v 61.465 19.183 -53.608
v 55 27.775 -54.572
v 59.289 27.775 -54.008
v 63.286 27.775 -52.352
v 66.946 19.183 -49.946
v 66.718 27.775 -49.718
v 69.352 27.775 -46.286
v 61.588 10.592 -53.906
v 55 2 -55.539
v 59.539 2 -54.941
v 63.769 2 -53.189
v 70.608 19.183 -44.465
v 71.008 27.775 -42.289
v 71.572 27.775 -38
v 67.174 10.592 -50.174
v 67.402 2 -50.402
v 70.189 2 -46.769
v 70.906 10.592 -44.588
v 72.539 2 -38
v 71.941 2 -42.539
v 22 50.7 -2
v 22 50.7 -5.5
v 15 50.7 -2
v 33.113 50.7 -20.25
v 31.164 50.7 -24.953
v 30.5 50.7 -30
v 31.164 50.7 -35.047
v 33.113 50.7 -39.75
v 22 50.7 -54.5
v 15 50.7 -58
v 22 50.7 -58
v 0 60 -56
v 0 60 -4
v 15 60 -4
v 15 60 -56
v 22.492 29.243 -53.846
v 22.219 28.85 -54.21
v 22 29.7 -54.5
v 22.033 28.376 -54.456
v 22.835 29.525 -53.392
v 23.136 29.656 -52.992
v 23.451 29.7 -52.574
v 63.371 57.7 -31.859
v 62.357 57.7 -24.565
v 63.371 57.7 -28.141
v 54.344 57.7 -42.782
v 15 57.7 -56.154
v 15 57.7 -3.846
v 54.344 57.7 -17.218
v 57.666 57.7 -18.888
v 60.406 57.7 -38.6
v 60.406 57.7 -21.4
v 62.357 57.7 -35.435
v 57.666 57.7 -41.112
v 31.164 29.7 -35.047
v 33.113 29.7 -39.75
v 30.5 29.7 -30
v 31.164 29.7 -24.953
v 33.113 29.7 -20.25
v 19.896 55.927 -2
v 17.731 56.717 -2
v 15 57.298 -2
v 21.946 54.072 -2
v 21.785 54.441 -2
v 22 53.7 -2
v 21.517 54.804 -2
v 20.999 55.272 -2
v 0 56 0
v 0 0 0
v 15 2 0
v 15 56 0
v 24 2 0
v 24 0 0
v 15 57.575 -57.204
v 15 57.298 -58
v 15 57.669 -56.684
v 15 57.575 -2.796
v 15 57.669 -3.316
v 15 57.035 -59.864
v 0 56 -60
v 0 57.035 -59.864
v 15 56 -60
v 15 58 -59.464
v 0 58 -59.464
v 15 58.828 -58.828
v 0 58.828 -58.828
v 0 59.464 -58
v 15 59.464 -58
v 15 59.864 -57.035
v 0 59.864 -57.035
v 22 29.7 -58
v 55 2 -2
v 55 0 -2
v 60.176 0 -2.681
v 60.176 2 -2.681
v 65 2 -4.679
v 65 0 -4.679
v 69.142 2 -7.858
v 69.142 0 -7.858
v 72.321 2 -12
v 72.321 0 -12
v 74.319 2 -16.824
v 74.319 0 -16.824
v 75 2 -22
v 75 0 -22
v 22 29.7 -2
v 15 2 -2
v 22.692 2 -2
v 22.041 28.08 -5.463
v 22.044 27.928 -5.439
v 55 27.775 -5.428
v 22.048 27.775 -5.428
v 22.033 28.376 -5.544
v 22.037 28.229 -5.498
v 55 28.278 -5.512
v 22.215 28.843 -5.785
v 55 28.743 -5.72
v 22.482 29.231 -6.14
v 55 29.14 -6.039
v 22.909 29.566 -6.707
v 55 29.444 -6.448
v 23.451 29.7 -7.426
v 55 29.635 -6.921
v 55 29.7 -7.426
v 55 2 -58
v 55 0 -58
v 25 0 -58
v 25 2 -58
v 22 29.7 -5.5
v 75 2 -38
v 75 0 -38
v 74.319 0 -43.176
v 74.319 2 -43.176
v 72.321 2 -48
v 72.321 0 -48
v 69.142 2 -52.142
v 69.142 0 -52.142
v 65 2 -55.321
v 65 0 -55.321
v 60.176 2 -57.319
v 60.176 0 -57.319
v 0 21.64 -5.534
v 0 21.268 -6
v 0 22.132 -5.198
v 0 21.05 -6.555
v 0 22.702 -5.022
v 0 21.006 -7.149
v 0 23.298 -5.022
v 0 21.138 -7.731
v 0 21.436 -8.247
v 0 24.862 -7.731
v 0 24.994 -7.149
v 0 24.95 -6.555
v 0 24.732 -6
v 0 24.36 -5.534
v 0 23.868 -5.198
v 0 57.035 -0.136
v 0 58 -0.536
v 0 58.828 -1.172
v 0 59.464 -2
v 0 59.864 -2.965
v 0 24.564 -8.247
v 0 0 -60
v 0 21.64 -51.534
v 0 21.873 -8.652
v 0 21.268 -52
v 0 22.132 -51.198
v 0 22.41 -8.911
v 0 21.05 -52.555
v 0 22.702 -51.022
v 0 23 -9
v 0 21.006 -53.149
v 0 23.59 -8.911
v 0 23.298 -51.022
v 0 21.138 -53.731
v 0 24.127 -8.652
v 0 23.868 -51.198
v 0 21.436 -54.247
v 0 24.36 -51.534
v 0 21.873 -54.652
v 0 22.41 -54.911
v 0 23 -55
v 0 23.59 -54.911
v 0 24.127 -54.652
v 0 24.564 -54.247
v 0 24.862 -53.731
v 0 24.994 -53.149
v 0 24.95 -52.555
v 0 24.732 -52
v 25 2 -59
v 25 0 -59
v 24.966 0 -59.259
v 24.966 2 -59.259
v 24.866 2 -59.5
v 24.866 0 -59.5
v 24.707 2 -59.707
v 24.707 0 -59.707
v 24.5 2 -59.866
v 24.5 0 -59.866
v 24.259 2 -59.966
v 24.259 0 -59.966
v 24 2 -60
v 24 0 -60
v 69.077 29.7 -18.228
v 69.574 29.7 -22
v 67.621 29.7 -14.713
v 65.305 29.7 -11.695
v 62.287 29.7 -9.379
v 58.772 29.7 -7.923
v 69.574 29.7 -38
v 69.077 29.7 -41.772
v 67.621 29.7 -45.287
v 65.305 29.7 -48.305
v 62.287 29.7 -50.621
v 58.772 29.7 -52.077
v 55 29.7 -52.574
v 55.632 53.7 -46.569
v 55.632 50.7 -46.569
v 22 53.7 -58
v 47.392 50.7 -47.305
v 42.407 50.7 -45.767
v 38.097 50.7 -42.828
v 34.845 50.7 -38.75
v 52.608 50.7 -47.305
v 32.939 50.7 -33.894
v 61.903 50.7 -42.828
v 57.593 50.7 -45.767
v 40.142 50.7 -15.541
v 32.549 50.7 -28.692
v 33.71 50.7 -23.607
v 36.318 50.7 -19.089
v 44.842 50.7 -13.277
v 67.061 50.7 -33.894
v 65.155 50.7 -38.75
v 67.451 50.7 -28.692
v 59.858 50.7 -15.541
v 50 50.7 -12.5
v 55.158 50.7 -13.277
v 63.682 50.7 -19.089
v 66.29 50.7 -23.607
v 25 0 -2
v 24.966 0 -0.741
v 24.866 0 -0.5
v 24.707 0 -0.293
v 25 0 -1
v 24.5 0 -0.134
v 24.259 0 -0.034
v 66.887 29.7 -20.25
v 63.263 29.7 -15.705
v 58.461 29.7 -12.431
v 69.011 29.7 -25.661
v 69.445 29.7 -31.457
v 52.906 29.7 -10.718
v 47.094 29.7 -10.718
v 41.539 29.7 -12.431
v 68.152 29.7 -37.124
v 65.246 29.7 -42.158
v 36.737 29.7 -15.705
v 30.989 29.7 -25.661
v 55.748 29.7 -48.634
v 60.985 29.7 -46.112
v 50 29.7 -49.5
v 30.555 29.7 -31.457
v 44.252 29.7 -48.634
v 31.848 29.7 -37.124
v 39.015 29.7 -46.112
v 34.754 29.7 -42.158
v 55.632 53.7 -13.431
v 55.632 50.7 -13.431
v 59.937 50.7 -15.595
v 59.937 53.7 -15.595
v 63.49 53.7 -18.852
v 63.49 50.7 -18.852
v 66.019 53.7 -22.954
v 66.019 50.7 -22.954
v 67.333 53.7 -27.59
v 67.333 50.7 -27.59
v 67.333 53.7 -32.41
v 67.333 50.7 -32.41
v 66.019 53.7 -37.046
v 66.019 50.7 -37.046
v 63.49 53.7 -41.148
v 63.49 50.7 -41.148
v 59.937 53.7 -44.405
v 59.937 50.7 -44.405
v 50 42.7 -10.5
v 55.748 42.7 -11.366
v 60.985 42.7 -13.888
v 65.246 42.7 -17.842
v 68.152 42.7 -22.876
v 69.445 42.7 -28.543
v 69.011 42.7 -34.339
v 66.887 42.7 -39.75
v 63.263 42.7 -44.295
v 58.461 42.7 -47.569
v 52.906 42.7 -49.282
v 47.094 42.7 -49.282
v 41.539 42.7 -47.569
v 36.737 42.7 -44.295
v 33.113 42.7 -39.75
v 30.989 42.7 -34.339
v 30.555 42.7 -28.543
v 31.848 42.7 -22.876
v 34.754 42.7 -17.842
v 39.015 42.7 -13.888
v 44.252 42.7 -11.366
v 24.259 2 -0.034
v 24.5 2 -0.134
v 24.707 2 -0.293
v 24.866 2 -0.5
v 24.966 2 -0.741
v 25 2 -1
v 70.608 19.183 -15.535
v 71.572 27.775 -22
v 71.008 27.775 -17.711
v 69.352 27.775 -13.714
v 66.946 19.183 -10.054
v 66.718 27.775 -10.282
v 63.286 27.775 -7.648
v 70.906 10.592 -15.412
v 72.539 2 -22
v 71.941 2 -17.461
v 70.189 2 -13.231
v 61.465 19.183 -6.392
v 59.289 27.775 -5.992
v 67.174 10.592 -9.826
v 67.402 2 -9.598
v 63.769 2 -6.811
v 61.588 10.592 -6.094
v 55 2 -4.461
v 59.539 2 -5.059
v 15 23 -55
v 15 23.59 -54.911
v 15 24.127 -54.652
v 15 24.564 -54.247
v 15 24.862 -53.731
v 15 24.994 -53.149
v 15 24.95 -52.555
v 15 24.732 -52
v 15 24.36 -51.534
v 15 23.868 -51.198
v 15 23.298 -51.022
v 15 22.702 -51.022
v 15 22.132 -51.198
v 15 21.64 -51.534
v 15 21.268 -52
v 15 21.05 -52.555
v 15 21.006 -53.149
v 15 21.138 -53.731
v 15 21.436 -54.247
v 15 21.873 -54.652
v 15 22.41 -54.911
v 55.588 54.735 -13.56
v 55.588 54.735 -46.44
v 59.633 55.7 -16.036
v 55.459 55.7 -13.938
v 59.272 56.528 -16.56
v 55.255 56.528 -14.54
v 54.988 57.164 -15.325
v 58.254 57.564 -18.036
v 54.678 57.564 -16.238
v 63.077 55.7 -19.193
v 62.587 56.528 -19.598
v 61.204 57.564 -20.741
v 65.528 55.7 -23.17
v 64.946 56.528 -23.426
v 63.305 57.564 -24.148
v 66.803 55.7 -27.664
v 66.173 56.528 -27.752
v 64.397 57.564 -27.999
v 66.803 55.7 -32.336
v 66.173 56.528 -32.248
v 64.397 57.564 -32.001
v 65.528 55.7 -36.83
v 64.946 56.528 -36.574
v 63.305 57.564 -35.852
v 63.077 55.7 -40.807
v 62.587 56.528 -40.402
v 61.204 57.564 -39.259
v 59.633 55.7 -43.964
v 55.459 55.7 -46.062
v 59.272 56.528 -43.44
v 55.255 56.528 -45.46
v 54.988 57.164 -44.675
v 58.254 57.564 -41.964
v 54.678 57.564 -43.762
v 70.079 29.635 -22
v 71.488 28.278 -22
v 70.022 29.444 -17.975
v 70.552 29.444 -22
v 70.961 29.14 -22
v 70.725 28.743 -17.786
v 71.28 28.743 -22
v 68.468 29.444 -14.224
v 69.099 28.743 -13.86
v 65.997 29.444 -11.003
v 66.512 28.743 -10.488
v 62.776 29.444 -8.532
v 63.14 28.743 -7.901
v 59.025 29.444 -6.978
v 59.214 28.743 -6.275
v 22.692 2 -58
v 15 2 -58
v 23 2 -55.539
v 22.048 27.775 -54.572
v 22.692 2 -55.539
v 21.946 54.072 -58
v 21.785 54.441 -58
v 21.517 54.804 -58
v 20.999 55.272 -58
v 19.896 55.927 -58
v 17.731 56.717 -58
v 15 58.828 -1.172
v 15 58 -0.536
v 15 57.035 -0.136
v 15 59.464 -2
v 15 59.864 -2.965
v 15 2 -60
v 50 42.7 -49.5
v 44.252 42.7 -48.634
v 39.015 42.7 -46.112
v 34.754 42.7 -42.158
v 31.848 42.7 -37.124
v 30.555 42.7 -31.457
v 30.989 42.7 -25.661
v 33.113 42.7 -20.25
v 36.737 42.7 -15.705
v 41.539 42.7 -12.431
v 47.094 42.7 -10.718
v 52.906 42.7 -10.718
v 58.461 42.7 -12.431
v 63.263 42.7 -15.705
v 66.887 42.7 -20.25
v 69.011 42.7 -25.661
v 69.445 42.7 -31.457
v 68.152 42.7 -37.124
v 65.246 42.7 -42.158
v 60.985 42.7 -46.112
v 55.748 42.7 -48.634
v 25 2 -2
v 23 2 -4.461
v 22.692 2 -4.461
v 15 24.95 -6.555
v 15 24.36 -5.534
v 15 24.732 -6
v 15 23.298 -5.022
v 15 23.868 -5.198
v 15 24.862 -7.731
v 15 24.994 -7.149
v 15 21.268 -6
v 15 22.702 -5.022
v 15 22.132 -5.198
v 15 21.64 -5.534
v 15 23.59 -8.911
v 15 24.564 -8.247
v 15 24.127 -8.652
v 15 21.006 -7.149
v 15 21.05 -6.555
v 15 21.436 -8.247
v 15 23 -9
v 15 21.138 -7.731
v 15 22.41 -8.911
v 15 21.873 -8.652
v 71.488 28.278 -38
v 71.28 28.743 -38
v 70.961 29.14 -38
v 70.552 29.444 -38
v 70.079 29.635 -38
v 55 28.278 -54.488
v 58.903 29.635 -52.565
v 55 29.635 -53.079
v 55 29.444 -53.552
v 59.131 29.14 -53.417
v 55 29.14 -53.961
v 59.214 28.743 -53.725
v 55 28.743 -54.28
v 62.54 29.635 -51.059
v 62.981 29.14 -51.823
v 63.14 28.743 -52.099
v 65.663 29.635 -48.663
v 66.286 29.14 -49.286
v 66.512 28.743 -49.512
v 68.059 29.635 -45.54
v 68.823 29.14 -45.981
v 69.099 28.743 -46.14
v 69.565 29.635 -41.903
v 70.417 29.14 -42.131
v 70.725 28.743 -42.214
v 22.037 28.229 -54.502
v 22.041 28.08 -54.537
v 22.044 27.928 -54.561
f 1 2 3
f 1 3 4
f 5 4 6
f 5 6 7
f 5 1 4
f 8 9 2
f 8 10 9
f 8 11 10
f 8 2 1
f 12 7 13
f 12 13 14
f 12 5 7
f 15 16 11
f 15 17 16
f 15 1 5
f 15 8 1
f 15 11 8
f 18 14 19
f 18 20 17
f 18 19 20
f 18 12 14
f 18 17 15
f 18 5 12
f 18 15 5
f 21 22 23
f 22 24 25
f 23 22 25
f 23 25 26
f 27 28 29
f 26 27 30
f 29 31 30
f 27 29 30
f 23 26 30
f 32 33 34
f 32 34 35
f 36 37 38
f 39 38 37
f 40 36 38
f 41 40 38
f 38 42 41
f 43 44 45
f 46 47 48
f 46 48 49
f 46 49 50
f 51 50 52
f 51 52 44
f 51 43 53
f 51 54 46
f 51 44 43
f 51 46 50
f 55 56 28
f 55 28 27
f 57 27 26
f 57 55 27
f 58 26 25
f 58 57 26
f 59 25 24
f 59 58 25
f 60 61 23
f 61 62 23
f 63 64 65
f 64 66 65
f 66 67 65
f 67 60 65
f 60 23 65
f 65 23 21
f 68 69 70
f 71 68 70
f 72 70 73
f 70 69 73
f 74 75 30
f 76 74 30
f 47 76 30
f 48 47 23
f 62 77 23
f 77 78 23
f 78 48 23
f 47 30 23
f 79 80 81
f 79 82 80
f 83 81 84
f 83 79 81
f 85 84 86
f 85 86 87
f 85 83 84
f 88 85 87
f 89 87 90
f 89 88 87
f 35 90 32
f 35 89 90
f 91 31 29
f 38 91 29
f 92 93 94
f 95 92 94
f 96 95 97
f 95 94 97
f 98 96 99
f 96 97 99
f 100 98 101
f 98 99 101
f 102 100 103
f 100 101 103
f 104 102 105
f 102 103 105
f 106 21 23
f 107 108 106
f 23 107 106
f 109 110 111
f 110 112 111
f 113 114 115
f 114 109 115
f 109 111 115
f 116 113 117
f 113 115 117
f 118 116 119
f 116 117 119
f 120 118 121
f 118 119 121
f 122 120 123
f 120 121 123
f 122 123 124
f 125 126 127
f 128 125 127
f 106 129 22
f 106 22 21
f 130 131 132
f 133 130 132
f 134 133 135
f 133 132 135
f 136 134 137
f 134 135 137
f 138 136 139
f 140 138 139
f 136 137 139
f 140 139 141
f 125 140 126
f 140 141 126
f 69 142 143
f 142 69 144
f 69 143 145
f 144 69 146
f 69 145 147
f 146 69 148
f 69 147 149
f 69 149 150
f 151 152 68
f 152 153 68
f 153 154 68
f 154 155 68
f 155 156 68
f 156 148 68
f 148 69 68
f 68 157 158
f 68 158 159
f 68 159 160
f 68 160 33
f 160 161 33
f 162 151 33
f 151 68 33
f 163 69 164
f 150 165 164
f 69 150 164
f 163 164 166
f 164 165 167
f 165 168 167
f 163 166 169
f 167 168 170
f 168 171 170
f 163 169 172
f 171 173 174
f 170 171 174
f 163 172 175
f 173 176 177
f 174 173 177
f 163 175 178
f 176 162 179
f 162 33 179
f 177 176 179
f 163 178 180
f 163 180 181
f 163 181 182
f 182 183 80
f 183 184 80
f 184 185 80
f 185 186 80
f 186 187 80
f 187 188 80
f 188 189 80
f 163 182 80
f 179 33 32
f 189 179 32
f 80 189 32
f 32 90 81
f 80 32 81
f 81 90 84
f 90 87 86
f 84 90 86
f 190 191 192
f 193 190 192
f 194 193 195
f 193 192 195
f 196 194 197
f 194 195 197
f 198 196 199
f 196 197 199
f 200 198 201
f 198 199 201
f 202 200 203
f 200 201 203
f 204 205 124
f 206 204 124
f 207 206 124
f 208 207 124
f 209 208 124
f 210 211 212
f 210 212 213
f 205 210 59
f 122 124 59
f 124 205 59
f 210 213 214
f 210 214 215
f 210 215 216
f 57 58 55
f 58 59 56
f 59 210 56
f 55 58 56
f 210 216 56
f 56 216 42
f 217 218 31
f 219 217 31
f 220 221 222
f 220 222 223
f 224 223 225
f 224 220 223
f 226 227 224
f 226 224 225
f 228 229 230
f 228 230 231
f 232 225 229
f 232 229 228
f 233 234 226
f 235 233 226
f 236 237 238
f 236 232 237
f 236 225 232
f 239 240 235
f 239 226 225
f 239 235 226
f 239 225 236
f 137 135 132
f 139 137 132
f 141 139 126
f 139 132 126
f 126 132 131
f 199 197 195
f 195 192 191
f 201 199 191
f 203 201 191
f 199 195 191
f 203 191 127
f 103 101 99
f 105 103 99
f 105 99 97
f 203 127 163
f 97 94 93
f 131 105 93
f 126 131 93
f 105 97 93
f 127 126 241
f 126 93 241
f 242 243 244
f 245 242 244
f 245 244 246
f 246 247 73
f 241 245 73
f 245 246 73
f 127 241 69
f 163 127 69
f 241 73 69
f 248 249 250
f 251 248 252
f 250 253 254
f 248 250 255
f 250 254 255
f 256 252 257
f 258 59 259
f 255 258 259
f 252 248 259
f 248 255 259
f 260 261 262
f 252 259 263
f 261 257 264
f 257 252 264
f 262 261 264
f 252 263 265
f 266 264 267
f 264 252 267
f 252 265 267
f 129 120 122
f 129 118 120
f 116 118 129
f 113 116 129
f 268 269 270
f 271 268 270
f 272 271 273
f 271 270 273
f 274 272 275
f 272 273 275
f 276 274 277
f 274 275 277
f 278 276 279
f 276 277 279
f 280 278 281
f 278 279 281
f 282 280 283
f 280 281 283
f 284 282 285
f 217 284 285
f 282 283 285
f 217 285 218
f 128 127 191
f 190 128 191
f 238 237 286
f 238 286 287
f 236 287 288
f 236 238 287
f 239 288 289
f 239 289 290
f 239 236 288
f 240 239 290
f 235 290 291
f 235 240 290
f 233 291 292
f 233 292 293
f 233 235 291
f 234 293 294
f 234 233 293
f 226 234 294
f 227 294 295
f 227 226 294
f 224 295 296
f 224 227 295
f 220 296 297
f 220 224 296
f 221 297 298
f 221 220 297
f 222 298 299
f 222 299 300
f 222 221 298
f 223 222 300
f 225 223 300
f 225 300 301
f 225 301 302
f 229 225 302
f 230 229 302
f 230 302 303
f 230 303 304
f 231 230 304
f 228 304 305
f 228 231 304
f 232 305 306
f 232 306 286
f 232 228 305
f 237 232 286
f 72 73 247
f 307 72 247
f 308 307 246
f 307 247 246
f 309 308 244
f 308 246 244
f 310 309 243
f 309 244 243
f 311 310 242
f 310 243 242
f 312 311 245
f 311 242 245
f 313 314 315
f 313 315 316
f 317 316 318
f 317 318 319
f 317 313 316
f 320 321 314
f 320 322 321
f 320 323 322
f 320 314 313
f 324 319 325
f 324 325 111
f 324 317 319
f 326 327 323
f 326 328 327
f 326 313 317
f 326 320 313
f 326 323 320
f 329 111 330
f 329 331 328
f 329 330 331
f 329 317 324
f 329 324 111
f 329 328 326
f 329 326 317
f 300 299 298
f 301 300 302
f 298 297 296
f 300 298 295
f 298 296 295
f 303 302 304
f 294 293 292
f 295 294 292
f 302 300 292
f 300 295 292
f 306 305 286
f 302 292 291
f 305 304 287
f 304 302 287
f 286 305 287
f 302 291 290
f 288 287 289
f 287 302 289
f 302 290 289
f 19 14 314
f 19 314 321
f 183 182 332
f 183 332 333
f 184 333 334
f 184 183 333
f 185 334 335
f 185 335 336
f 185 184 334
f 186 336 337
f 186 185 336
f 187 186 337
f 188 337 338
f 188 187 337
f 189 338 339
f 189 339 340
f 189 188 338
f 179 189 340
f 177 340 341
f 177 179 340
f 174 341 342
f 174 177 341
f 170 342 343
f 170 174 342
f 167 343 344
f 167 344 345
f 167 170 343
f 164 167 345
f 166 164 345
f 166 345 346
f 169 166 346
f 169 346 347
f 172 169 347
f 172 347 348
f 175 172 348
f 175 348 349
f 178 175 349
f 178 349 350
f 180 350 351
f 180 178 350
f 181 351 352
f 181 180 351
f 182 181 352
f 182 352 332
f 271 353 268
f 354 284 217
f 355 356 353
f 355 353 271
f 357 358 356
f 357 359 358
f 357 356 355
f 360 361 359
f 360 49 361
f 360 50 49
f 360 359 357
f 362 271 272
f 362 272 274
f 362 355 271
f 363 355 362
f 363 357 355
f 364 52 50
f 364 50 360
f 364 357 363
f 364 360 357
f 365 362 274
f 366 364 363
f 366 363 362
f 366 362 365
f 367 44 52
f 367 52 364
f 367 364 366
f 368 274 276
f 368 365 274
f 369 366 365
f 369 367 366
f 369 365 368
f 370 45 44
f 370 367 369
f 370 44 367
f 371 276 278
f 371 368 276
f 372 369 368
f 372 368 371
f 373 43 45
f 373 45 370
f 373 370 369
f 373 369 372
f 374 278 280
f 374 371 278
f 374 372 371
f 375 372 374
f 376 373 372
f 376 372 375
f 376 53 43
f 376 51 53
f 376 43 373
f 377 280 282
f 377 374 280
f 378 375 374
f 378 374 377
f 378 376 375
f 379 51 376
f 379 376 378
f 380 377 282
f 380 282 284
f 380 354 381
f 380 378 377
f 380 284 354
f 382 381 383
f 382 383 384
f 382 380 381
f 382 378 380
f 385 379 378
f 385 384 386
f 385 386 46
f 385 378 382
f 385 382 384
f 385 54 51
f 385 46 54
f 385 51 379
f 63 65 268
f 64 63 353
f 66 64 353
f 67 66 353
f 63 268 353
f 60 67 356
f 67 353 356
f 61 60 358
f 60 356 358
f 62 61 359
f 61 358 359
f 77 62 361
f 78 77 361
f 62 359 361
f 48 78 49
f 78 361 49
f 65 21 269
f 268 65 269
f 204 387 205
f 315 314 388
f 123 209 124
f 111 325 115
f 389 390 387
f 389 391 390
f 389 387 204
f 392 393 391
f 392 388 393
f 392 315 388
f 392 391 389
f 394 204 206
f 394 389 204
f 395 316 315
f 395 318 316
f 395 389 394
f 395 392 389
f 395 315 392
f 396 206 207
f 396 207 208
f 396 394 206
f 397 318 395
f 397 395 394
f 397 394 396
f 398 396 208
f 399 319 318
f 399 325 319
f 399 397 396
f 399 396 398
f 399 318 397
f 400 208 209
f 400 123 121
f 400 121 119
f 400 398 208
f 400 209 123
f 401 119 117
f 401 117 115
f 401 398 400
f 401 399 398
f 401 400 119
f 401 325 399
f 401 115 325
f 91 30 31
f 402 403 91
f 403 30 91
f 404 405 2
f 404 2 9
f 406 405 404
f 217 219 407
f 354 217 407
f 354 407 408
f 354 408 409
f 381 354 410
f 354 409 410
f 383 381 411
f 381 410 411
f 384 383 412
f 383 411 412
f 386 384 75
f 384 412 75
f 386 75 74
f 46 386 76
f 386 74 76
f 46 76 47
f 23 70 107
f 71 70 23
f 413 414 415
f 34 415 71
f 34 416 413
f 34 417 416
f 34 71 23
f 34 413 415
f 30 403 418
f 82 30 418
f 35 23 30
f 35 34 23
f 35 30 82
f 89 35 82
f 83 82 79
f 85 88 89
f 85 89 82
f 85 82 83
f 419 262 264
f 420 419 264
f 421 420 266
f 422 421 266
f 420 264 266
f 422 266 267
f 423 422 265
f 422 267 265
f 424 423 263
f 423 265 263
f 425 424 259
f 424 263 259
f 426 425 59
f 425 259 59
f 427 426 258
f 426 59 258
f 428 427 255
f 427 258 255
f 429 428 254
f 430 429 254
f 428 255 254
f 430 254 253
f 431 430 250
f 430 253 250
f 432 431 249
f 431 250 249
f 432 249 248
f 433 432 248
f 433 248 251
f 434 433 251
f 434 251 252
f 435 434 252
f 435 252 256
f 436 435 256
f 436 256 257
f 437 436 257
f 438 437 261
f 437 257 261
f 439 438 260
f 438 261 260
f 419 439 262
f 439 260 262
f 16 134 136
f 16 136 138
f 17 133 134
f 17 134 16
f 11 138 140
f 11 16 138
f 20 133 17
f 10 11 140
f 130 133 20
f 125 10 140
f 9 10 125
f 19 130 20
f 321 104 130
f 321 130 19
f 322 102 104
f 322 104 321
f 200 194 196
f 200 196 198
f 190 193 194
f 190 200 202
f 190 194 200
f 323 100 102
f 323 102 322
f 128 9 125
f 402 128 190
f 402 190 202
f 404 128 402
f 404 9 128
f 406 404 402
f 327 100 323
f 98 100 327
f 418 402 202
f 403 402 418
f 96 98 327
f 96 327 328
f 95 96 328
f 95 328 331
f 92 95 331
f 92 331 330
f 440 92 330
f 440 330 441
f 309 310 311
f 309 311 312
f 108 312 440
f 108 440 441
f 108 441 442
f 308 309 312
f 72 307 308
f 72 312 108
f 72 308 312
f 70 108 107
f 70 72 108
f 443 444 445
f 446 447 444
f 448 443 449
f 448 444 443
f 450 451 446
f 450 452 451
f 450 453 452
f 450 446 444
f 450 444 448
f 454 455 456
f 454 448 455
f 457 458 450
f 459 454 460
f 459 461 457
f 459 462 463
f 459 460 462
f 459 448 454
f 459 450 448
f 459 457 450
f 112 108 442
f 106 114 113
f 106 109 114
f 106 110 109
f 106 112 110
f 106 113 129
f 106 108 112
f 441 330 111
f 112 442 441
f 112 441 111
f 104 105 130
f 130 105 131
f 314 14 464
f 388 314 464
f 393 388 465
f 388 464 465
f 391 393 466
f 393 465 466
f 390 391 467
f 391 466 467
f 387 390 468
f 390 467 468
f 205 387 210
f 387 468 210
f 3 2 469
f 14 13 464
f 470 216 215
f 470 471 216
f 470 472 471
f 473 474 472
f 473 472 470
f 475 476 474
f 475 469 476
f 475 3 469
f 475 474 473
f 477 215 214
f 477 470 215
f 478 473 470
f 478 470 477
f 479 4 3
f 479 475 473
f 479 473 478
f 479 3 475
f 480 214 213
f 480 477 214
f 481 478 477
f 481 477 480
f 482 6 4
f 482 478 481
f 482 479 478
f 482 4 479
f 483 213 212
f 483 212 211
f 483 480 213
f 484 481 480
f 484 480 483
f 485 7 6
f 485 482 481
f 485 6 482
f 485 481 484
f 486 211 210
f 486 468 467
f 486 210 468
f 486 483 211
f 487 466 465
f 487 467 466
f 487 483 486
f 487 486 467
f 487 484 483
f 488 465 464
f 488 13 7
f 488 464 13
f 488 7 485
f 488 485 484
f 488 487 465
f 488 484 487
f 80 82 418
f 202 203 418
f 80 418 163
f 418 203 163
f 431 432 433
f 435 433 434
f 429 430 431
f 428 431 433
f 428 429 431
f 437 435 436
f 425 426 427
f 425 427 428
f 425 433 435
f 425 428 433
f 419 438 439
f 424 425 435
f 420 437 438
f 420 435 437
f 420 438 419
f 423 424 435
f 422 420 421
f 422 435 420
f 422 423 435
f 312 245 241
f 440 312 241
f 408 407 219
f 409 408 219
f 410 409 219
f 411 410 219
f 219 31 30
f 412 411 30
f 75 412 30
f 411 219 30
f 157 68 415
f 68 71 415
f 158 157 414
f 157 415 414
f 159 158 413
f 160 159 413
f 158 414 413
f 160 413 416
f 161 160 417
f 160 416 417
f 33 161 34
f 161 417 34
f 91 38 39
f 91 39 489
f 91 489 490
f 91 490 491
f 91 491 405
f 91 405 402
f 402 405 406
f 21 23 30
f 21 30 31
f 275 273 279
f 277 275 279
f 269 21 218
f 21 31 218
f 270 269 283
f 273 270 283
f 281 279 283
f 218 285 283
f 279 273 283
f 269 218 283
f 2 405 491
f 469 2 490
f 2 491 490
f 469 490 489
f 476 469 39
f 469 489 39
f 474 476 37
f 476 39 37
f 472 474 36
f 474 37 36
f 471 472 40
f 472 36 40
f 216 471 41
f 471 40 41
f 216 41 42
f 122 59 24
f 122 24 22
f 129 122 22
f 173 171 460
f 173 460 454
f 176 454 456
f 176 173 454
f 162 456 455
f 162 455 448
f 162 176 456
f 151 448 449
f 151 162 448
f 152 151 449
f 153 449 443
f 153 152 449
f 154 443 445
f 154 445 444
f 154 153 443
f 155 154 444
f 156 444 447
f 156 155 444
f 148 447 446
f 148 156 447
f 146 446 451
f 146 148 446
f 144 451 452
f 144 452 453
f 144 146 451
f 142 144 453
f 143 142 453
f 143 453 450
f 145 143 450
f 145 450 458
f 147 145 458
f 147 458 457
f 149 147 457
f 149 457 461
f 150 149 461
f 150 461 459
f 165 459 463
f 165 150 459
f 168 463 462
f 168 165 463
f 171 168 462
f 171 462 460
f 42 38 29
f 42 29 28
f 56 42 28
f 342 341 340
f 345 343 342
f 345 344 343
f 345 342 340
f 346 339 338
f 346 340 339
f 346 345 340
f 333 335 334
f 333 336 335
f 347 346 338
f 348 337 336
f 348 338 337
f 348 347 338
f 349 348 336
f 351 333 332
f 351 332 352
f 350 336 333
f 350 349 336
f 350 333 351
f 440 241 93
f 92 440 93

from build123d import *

# Parameters (mm, degrees)
ESQUISSE1_W        = 60
ESQUISSE1_H        = 60
ESQUISSE1_R        = 2
BOSS_EXTRU_1_DEPTH = 15
BOSS_EXTRU_2_DEPTH = 2
BOSS_EXTRU_3_DEPTH = 27.7
CHANFREIN1_SIZE    = 1.5
CHANFREIN1_SIZE_2  = 40
CHANFREIN2_SIZE    = 1
CHANFREIN2_SIZE_2  = 40
BOSS_EXTRU_4_DEPTH = 21
ESQUISSE5_R        = 19.5
BOSS_EXTRU_5_DEPTH = 13
ESQUISSE6_R        = 19.5
BOSS_EXTRU_6_DEPTH = 8
CHANFREIN3_SIZE    = 8
CHANFREIN3_SIZE_2  = 2
BOSS_EXTRU_9_DEPTH = 7
CONG_3_R           = 2
CONG_4_R           = 4
CONG_5_R           = 4


with BuildPart() as part:
    # Esquisse1 → Boss.-Extru.1 (new body)
    with BuildSketch(Plane(origin=(0, 0, 0), x_dir=(0, 0, -1), z_dir=(1, 0, 0))):
        with Locations((30, 30)):
            Rectangle(ESQUISSE1_W, ESQUISSE1_H)
        with Locations((7, 23)):
            Circle(ESQUISSE1_R, mode=Mode.SUBTRACT)
        with Locations((53, 23)):
            Circle(ESQUISSE1_R, mode=Mode.SUBTRACT)
    extrude(amount=BOSS_EXTRU_1_DEPTH)

    # Esquisse2 → Boss.-Extru.2 (add)
    with BuildSketch(Plane.XZ):
        with BuildLine():
            Line((15, 0), (24, 0))
            ThreePointArc((24, 0), (24.707106781, -0.292893219), (25, -1))
            Line((25, -1), (25, -2))
            Line((25, -2), (55, -2))
            ThreePointArc((55, -2), (69.142135624, -7.857864376), (75, -22))
            Line((75, -22), (75, -38))
            ThreePointArc((75, -38), (69.142135624, -52.142135624), (55, -58))
            Line((55, -58), (25, -58))
            Line((25, -58), (25, -59))
            ThreePointArc((25, -59), (24.707106781, -59.707106781), (24, -60))
            Line((24, -60), (15, -60))
            Line((15, -60), (15, 0))
        make_face()
    extrude(amount=-BOSS_EXTRU_2_DEPTH)

    # Esquisse3 → Boss.-Extru.3 (add)
    with BuildSketch(Plane(origin=(0, 2, 0), x_dir=(1, 0, 0), z_dir=(0, 1, 0))):
        with BuildLine():
            Line((23, 2), (15, 2))
            Line((15, 2), (15, 58))
            Line((15, 58), (23, 58))
            Line((23, 58), (23, 56))
            Line((23, 56), (55, 56))
            ThreePointArc((55, 56), (67.727922061, 50.727922061), (73, 38))
            Line((73, 38), (73, 22))
            ThreePointArc((73, 22), (67.727922061, 9.272077939), (55, 4))
            Line((55, 4), (23, 4))
            Line((23, 4), (23, 2))
        make_face()
    extrude(amount=BOSS_EXTRU_3_DEPTH)

    # Chanfrein1
    # the kernel refuses this chamfer: 40, 1.5 mm, written as the material it takes off along each edge
    with BuildSketch(Plane(origin=(23, 29.7, -56), x_dir=(0, 0.7157643485721592, 0.6983418914207227), z_dir=(1, 0, 0))) as chanfrein1_piece_1_section:
        Polygon((CHANFREIN1_SIZE * 0.698341891421, CHANFREIN1_SIZE * 0.715764348572), (-CHANFREIN1_SIZE_2 * 0.715764348572, CHANFREIN1_SIZE_2 * 0.698341891421), (0, 0), align=None)
    chanfrein1_piece_1 = extrude(amount=32, mode=Mode.PRIVATE)
    chanfrein1_piece_1 = split(chanfrein1_piece_1, bisect_by=Plane(origin=(37.024131868, 2, -55.4897808), z_dir=(0, 1, 0)), keep=Keep.TOP, mode=Mode.PRIVATE)
    add(chanfrein1_piece_1, mode=Mode.SUBTRACT)
    with BuildSketch(Plane(origin=(55, 29.7, -38), x_dir=(0, 0, -1), z_dir=(-1, 0, 0))) as chanfrein1_piece_2_section:
        Polygon((18 - CHANFREIN1_SIZE, 0), (18, CHANFREIN1_SIZE_2), (18, 0), align=None)
    chanfrein1_piece_2 = revolve(axis=Axis((55, 29.7, -38), (0, -1, 0)), revolution_arc=90, mode=Mode.PRIVATE)
    chanfrein1_piece_2 = split(chanfrein1_piece_2, bisect_by=Plane(origin=(67.098576513, 2, -50.098576513), z_dir=(0, 1, 0)), keep=Keep.TOP, mode=Mode.PRIVATE)
    add(chanfrein1_piece_2, mode=Mode.SUBTRACT)
    with BuildSketch(Plane(origin=(55, 29.7, -4), x_dir=(0, 0.7157643485721598, -0.698341891420722), z_dir=(-1, 0, 0))) as chanfrein1_piece_3_section:
        Polygon((CHANFREIN1_SIZE * 0.698341891421, CHANFREIN1_SIZE * 0.715764348572), (-CHANFREIN1_SIZE_2 * 0.715764348572, CHANFREIN1_SIZE_2 * 0.698341891421), (0, 0), align=None)
    chanfrein1_piece_3 = extrude(amount=32, mode=Mode.PRIVATE)
    chanfrein1_piece_3 = split(chanfrein1_piece_3, bisect_by=Plane(origin=(52.691459865, 2, -4.656531492), z_dir=(0, 1, 0)), keep=Keep.TOP, mode=Mode.PRIVATE)
    add(chanfrein1_piece_3, mode=Mode.SUBTRACT)
    with BuildSketch(Plane(origin=(73, 29.7, -38), x_dir=(-0.6983418914207212, 0.7157643485721609, 0), z_dir=(0, 0, 1))) as chanfrein1_piece_4_section:
        Polygon((CHANFREIN1_SIZE * 0.698341891421, CHANFREIN1_SIZE * 0.715764348572), (-CHANFREIN1_SIZE_2 * 0.715764348572, CHANFREIN1_SIZE_2 * 0.698341891421), (0, 0), align=None)
    chanfrein1_piece_4 = extrude(amount=16, mode=Mode.PRIVATE)
    chanfrein1_piece_4 = split(chanfrein1_piece_4, bisect_by=Plane(origin=(72.334165333, 2, -35.67535471), z_dir=(0, 1, 0)), keep=Keep.TOP, mode=Mode.PRIVATE)
    add(chanfrein1_piece_4, mode=Mode.SUBTRACT)
    with BuildSketch(Plane(origin=(55, 29.7, -22), x_dir=(1, 0, 0), z_dir=(0, 0, -1))) as chanfrein1_piece_5_section:
        Polygon((18 - CHANFREIN1_SIZE, 0), (18, CHANFREIN1_SIZE_2), (18, 0), align=None)
    chanfrein1_piece_5 = revolve(axis=Axis((55, 29.7, -22), (0, -1, 0)), revolution_arc=90, mode=Mode.PRIVATE)
    chanfrein1_piece_5 = split(chanfrein1_piece_5, bisect_by=Plane(origin=(67.098576513, 2, -9.901423487), z_dir=(0, 1, 0)), keep=Keep.TOP, mode=Mode.PRIVATE)
    add(chanfrein1_piece_5, mode=Mode.SUBTRACT)

    # Chanfrein2
    # the kernel refuses this chamfer: 40, 1 mm, written as the material it takes off along each edge
    with BuildSketch(Plane(origin=(23, 29.7, 49.498798633), x_dir=(-0.5451034374320658, 0.8383687986201215, 0), z_dir=(0, 0, -1))) as chanfrein2_piece_1_section:
        Polygon((CHANFREIN2_SIZE * 0.545103437432, -CHANFREIN2_SIZE * 0.83836879862), (-CHANFREIN2_SIZE_2 * 0.83836879862, -CHANFREIN2_SIZE_2 * 0.545103437432), (0, 0), align=None)
    chanfrein2_piece_1 = extrude(amount=211.497597266, mode=Mode.PRIVATE)
    chanfrein2_piece_1 = split(chanfrein2_piece_1, bisect_by=Plane(origin=(22.633717158, 2, -3.549424262), z_dir=(0, 1, 0)), keep=Keep.TOP, mode=Mode.PRIVATE)
    chanfrein2_piece_1 = split(chanfrein2_piece_1, bisect_by=Plane(origin=(22.633717158, 18.944605509, -5.096672707), z_dir=(0, 0.03747366058909413, 0.9992976157091807)), keep=Keep.TOP, mode=Mode.PRIVATE)
    add(chanfrein2_piece_1, mode=Mode.SUBTRACT)
    with BuildSketch(Plane(origin=(23, 29.7, 49.498798633), x_dir=(-0.5451034374320658, 0.8383687986201215, 0), z_dir=(0, 0, -1))) as chanfrein2_piece_2_section:
        Polygon((CHANFREIN2_SIZE * 0.545103437432, -CHANFREIN2_SIZE * 0.83836879862), (-CHANFREIN2_SIZE_2 * 0.83836879862, -CHANFREIN2_SIZE_2 * 0.545103437432), (0, 0), align=None)
    chanfrein2_piece_2 = extrude(amount=211.497597266, mode=Mode.PRIVATE)
    chanfrein2_piece_2 = split(chanfrein2_piece_2, bisect_by=Plane(origin=(22.633717158, 2, -56.450575738), z_dir=(0, 1, 0)), keep=Keep.TOP, mode=Mode.PRIVATE)
    chanfrein2_piece_2 = split(chanfrein2_piece_2, bisect_by=Plane(origin=(22.633717158, 18.944605509, -54.903327293), z_dir=(0, 0.03747366058909413, -0.9992976157091807)), keep=Keep.TOP, mode=Mode.PRIVATE)
    add(chanfrein2_piece_2, mode=Mode.SUBTRACT)
    with BuildSketch(Plane(origin=(23, 29.7, 101.998798633), x_dir=(-0.5451034374320658, 0.8383687986201215, -1.1066265363005755e-15), z_dir=(0, 0, -1))) as chanfrein2_piece_3_section:
        Polygon((CHANFREIN2_SIZE * 0.545103437432, -CHANFREIN2_SIZE * 0.83836879862), (-CHANFREIN2_SIZE_2 * 0.83836879862, -CHANFREIN2_SIZE_2 * 0.545103437432), (0, 0), align=None)
    chanfrein2_piece_3 = extrude(amount=211.497597266, mode=Mode.PRIVATE)
    chanfrein2_piece_3 = split(chanfrein2_piece_3, bisect_by=Plane(origin=(22.633717158, 2, -3.549424262), z_dir=(0, 1, 0)), keep=Keep.TOP, mode=Mode.PRIVATE)
    chanfrein2_piece_3 = split(chanfrein2_piece_3, bisect_by=Plane(origin=(22.633717158, 18.944605509, -5.096672707), z_dir=(0, 0.03747366058909413, 0.9992976157091807)), keep=Keep.TOP, mode=Mode.PRIVATE)
    add(chanfrein2_piece_3, mode=Mode.SUBTRACT)
    with BuildSketch(Plane(origin=(23, 29.7, 101.998798633), x_dir=(-0.5451034374320658, 0.8383687986201215, -1.1066265363005755e-15), z_dir=(0, 0, -1))) as chanfrein2_piece_4_section:
        Polygon((CHANFREIN2_SIZE * 0.545103437432, -CHANFREIN2_SIZE * 0.83836879862), (-CHANFREIN2_SIZE_2 * 0.83836879862, -CHANFREIN2_SIZE_2 * 0.545103437432), (0, 0), align=None)
    chanfrein2_piece_4 = extrude(amount=211.497597266, mode=Mode.PRIVATE)
    chanfrein2_piece_4 = split(chanfrein2_piece_4, bisect_by=Plane(origin=(22.633717158, 2, -56.450575738), z_dir=(0, 1, 0)), keep=Keep.TOP, mode=Mode.PRIVATE)
    chanfrein2_piece_4 = split(chanfrein2_piece_4, bisect_by=Plane(origin=(22.633717158, 18.944605509, -54.903327293), z_dir=(0, 0.03747366058909413, -0.9992976157091807)), keep=Keep.TOP, mode=Mode.PRIVATE)
    add(chanfrein2_piece_4, mode=Mode.SUBTRACT)

    # Esquisse4 → Boss.-Extru.4 (add)
    with BuildSketch(Plane(origin=(0, 29.7, 0), x_dir=(1, 0, 0), z_dir=(0, 1, 0))):
        with BuildLine():
            Line((22, 54.5), (33.112504626, 39.75))
            ThreePointArc((33.112504626, 39.75), (30.5, 30), (33.112504626, 20.25))
            Line((33.112504626, 20.25), (22, 5.5))
            Line((22, 5.5), (22, 2))
            Line((22, 2), (15, 2))
            Line((15, 2), (15, 58))
            Line((15, 58), (22, 58))
            Line((22, 58), (22, 54.5))
        make_face()
    extrude(amount=BOSS_EXTRU_4_DEPTH)

    # Congé3
    # the kernel refuses this fillet: 2 mm, written as the material it takes off along each edge
    with BuildSketch(Plane(origin=(55, 29.7, -22), x_dir=(1, 0, 0), z_dir=(0, 0, -1))) as cong_3_piece_1:
        with BuildLine():
            CenterArc((16.5 - CONG_3_R * 0.963202877981, CONG_3_R), CONG_3_R, 270, 87.852414572)
            Line((16.5 - CONG_3_R * 0.963202877981, 0), (16.5, 0))
            Line((16.5, 0), (16.5 + CONG_3_R * 0.0360947377279, CONG_3_R * 0.962526339411))
        make_face()
    revolve(axis=Axis((55, 29.7, -22), (0, -1, 0)), revolution_arc=90, mode=Mode.SUBTRACT)
    with BuildSketch(Plane(origin=(71.5, 29.7, -38), x_dir=(0.03747366058909278, -0.9992976157091809, 0), z_dir=(0, 0, 1))) as cong_3_piece_2:
        with BuildLine():
            CenterArc((CONG_3_R * 0.963202877981, -CONG_3_R), CONG_3_R, 90, 87.852414572)
            Line((-CONG_3_R * 0.0360947377279, -CONG_3_R * 0.962526339411), (0, 0))
            Line((0, 0), (CONG_3_R * 0.963202877981, 0))
        make_face()
    extrude(amount=16, mode=Mode.SUBTRACT)
    with BuildSketch(Plane(origin=(55, 29.7, -5.5), x_dir=(1.1487780265352356e-15, -0.9992976157091819, 0.037473660589062784), z_dir=(-1, 0, 0))) as cong_3_piece_3_section:
        with BuildLine():
            CenterArc((CONG_3_R * 0.963202877981, -CONG_3_R), CONG_3_R, 90, 87.852414572)
            Line((-CONG_3_R * 0.0360947377279, -CONG_3_R * 0.962526339411), (0, 0))
            Line((0, 0), (CONG_3_R * 0.963202877981, 0))
        make_face()
    cong_3_piece_3 = extrude(amount=37.81601439, mode=Mode.PRIVATE)
    cong_3_piece_3 = split(cong_3_piece_3, bisect_by=Plane(origin=(22.021307393, 28.847704283, -5.913963971), z_dir=(0.9996876464081229, 0.024992191160203014, 0)), keep=Keep.TOP, mode=Mode.PRIVATE)
    cong_3_piece_3 = split(cong_3_piece_3, bisect_by=Plane(origin=(28.231231543, 29.263672501, -13.770922565), z_dir=(0.7986984257525773, 0, 0.6017315221096157)), keep=Keep.TOP, mode=Mode.PRIVATE)
    add(cong_3_piece_3, mode=Mode.SUBTRACT)
    with BuildSketch(Plane(origin=(55, 29.7, -38), x_dir=(0, 0, -1), z_dir=(-1, 0, 0))) as cong_3_piece_4:
        with BuildLine():
            CenterArc((16.5 - CONG_3_R * 0.963202877981, CONG_3_R), CONG_3_R, 270, 87.852414572)
            Line((16.5 - CONG_3_R * 0.963202877981, 0), (16.5, 0))
            Line((16.5, 0), (16.5 + CONG_3_R * 0.0360947377279, CONG_3_R * 0.962526339411))
        make_face()
    revolve(axis=Axis((55, 29.7, -38), (0, -1, 0)), revolution_arc=90, mode=Mode.SUBTRACT)
    with BuildSketch(Plane(origin=(17.18398561, 29.7, -54.5), x_dir=(1.1457522722959319e-15, -0.9992976157091807, -0.03747366058909278), z_dir=(1, 0, 0))) as cong_3_piece_5_section:
        with BuildLine():
            CenterArc((CONG_3_R * 0.963202877981, -CONG_3_R), CONG_3_R, 90, 87.852414572)
            Line((-CONG_3_R * 0.0360947377279, -CONG_3_R * 0.962526339411), (0, 0))
            Line((0, 0), (CONG_3_R * 0.963202877981, 0))
        make_face()
    cong_3_piece_5 = extrude(amount=37.81601439, mode=Mode.PRIVATE)
    cong_3_piece_5 = split(cong_3_piece_5, bisect_by=Plane(origin=(22.021307393, 28.847704283, -54.086036029), z_dir=(0.9996876464081229, 0.024992191160203014, 0)), keep=Keep.TOP, mode=Mode.PRIVATE)
    cong_3_piece_5 = split(cong_3_piece_5, bisect_by=Plane(origin=(28.231231543, 29.263672501, -46.229077435), z_dir=(0.798698425752577, 0, -0.6017315221096161)), keep=Keep.TOP, mode=Mode.PRIVATE)
    add(cong_3_piece_5, mode=Mode.SUBTRACT)

    # Congé5
    cong_5_edges = [part.edges().sort_by_distance(p)[0] for p in [
        (7.5, 60, 0),
        (7.5, 60, -60),
    ]]
    fillet(cong_5_edges, radius=CONG_5_R)


with BuildPart() as body_2:
    # Esquisse5 → Boss.-Extru.5 (new body)
    with BuildSketch(Plane(origin=(0, 29.7, 0), x_dir=(1, 0, 0), z_dir=(0, 1, 0))):
        with Locations(Location((50, 30, 0), (0, 0, 90))):
            Circle(ESQUISSE5_R)
    extrude(amount=BOSS_EXTRU_5_DEPTH)


with BuildPart() as body_3:
    # Esquisse6 → Boss.-Extru.6 (new body)
    with BuildSketch(Plane(origin=(0, 42.7, 0), x_dir=(1, 0, 0), z_dir=(0, 1, 0))):
        with Locations(Location((50, 30, 0), (0, 0, 270))):
            Circle(ESQUISSE6_R)
    extrude(amount=BOSS_EXTRU_6_DEPTH)

    # Chanfrein3
    # the kernel refuses this chamfer: 8, 2 mm, written as the material it takes off along each edge
    with BuildSketch(Plane(origin=(50, 50.7, -30), x_dir=(0, 0, 1), z_dir=(-1, 0, 0))) as chanfrein3_piece_1:
        Polygon((19.5, -CHANFREIN3_SIZE), (19.5 - CHANFREIN3_SIZE_2, 0), (19.5, 0), align=None)
    revolve(axis=Axis((50, 50.7, -30), (0, 1, 0)), mode=Mode.SUBTRACT)


with BuildPart() as body_4:
    # Esquisse8 → Boss.-Extru.9 (new body)
    with BuildSketch(Plane(origin=(0, 50.7, 0), x_dir=(1, 0, 0), z_dir=(0, 1, 0))):
        with BuildLine():
            Line((15, 2), (22, 2))
            Line((22, 2), (55.631600149, 13.430899851))
            ThreePointArc((55.631600149, 13.430899851), (67.5, 30), (55.631600149, 46.569100149))
            Line((55.631600149, 46.569100149), (22, 58))
            Line((22, 58), (15, 58))
            Line((15, 58), (15, 2))
        make_face()
    extrude(amount=BOSS_EXTRU_9_DEPTH)

    # Congé4
    cong_4_edges = [body_4.edges().sort_by_distance(p)[0] for p in [
        (38.815800075, 57.7, -7.715449925),
        (38.815800075, 57.7, -52.284550075),
        (67.5, 57.7, -30),
    ]]
    fillet(cong_4_edges, radius=CONG_4_R)


solid = Compound([part.part, body_2.part, body_3.part, body_4.part])
